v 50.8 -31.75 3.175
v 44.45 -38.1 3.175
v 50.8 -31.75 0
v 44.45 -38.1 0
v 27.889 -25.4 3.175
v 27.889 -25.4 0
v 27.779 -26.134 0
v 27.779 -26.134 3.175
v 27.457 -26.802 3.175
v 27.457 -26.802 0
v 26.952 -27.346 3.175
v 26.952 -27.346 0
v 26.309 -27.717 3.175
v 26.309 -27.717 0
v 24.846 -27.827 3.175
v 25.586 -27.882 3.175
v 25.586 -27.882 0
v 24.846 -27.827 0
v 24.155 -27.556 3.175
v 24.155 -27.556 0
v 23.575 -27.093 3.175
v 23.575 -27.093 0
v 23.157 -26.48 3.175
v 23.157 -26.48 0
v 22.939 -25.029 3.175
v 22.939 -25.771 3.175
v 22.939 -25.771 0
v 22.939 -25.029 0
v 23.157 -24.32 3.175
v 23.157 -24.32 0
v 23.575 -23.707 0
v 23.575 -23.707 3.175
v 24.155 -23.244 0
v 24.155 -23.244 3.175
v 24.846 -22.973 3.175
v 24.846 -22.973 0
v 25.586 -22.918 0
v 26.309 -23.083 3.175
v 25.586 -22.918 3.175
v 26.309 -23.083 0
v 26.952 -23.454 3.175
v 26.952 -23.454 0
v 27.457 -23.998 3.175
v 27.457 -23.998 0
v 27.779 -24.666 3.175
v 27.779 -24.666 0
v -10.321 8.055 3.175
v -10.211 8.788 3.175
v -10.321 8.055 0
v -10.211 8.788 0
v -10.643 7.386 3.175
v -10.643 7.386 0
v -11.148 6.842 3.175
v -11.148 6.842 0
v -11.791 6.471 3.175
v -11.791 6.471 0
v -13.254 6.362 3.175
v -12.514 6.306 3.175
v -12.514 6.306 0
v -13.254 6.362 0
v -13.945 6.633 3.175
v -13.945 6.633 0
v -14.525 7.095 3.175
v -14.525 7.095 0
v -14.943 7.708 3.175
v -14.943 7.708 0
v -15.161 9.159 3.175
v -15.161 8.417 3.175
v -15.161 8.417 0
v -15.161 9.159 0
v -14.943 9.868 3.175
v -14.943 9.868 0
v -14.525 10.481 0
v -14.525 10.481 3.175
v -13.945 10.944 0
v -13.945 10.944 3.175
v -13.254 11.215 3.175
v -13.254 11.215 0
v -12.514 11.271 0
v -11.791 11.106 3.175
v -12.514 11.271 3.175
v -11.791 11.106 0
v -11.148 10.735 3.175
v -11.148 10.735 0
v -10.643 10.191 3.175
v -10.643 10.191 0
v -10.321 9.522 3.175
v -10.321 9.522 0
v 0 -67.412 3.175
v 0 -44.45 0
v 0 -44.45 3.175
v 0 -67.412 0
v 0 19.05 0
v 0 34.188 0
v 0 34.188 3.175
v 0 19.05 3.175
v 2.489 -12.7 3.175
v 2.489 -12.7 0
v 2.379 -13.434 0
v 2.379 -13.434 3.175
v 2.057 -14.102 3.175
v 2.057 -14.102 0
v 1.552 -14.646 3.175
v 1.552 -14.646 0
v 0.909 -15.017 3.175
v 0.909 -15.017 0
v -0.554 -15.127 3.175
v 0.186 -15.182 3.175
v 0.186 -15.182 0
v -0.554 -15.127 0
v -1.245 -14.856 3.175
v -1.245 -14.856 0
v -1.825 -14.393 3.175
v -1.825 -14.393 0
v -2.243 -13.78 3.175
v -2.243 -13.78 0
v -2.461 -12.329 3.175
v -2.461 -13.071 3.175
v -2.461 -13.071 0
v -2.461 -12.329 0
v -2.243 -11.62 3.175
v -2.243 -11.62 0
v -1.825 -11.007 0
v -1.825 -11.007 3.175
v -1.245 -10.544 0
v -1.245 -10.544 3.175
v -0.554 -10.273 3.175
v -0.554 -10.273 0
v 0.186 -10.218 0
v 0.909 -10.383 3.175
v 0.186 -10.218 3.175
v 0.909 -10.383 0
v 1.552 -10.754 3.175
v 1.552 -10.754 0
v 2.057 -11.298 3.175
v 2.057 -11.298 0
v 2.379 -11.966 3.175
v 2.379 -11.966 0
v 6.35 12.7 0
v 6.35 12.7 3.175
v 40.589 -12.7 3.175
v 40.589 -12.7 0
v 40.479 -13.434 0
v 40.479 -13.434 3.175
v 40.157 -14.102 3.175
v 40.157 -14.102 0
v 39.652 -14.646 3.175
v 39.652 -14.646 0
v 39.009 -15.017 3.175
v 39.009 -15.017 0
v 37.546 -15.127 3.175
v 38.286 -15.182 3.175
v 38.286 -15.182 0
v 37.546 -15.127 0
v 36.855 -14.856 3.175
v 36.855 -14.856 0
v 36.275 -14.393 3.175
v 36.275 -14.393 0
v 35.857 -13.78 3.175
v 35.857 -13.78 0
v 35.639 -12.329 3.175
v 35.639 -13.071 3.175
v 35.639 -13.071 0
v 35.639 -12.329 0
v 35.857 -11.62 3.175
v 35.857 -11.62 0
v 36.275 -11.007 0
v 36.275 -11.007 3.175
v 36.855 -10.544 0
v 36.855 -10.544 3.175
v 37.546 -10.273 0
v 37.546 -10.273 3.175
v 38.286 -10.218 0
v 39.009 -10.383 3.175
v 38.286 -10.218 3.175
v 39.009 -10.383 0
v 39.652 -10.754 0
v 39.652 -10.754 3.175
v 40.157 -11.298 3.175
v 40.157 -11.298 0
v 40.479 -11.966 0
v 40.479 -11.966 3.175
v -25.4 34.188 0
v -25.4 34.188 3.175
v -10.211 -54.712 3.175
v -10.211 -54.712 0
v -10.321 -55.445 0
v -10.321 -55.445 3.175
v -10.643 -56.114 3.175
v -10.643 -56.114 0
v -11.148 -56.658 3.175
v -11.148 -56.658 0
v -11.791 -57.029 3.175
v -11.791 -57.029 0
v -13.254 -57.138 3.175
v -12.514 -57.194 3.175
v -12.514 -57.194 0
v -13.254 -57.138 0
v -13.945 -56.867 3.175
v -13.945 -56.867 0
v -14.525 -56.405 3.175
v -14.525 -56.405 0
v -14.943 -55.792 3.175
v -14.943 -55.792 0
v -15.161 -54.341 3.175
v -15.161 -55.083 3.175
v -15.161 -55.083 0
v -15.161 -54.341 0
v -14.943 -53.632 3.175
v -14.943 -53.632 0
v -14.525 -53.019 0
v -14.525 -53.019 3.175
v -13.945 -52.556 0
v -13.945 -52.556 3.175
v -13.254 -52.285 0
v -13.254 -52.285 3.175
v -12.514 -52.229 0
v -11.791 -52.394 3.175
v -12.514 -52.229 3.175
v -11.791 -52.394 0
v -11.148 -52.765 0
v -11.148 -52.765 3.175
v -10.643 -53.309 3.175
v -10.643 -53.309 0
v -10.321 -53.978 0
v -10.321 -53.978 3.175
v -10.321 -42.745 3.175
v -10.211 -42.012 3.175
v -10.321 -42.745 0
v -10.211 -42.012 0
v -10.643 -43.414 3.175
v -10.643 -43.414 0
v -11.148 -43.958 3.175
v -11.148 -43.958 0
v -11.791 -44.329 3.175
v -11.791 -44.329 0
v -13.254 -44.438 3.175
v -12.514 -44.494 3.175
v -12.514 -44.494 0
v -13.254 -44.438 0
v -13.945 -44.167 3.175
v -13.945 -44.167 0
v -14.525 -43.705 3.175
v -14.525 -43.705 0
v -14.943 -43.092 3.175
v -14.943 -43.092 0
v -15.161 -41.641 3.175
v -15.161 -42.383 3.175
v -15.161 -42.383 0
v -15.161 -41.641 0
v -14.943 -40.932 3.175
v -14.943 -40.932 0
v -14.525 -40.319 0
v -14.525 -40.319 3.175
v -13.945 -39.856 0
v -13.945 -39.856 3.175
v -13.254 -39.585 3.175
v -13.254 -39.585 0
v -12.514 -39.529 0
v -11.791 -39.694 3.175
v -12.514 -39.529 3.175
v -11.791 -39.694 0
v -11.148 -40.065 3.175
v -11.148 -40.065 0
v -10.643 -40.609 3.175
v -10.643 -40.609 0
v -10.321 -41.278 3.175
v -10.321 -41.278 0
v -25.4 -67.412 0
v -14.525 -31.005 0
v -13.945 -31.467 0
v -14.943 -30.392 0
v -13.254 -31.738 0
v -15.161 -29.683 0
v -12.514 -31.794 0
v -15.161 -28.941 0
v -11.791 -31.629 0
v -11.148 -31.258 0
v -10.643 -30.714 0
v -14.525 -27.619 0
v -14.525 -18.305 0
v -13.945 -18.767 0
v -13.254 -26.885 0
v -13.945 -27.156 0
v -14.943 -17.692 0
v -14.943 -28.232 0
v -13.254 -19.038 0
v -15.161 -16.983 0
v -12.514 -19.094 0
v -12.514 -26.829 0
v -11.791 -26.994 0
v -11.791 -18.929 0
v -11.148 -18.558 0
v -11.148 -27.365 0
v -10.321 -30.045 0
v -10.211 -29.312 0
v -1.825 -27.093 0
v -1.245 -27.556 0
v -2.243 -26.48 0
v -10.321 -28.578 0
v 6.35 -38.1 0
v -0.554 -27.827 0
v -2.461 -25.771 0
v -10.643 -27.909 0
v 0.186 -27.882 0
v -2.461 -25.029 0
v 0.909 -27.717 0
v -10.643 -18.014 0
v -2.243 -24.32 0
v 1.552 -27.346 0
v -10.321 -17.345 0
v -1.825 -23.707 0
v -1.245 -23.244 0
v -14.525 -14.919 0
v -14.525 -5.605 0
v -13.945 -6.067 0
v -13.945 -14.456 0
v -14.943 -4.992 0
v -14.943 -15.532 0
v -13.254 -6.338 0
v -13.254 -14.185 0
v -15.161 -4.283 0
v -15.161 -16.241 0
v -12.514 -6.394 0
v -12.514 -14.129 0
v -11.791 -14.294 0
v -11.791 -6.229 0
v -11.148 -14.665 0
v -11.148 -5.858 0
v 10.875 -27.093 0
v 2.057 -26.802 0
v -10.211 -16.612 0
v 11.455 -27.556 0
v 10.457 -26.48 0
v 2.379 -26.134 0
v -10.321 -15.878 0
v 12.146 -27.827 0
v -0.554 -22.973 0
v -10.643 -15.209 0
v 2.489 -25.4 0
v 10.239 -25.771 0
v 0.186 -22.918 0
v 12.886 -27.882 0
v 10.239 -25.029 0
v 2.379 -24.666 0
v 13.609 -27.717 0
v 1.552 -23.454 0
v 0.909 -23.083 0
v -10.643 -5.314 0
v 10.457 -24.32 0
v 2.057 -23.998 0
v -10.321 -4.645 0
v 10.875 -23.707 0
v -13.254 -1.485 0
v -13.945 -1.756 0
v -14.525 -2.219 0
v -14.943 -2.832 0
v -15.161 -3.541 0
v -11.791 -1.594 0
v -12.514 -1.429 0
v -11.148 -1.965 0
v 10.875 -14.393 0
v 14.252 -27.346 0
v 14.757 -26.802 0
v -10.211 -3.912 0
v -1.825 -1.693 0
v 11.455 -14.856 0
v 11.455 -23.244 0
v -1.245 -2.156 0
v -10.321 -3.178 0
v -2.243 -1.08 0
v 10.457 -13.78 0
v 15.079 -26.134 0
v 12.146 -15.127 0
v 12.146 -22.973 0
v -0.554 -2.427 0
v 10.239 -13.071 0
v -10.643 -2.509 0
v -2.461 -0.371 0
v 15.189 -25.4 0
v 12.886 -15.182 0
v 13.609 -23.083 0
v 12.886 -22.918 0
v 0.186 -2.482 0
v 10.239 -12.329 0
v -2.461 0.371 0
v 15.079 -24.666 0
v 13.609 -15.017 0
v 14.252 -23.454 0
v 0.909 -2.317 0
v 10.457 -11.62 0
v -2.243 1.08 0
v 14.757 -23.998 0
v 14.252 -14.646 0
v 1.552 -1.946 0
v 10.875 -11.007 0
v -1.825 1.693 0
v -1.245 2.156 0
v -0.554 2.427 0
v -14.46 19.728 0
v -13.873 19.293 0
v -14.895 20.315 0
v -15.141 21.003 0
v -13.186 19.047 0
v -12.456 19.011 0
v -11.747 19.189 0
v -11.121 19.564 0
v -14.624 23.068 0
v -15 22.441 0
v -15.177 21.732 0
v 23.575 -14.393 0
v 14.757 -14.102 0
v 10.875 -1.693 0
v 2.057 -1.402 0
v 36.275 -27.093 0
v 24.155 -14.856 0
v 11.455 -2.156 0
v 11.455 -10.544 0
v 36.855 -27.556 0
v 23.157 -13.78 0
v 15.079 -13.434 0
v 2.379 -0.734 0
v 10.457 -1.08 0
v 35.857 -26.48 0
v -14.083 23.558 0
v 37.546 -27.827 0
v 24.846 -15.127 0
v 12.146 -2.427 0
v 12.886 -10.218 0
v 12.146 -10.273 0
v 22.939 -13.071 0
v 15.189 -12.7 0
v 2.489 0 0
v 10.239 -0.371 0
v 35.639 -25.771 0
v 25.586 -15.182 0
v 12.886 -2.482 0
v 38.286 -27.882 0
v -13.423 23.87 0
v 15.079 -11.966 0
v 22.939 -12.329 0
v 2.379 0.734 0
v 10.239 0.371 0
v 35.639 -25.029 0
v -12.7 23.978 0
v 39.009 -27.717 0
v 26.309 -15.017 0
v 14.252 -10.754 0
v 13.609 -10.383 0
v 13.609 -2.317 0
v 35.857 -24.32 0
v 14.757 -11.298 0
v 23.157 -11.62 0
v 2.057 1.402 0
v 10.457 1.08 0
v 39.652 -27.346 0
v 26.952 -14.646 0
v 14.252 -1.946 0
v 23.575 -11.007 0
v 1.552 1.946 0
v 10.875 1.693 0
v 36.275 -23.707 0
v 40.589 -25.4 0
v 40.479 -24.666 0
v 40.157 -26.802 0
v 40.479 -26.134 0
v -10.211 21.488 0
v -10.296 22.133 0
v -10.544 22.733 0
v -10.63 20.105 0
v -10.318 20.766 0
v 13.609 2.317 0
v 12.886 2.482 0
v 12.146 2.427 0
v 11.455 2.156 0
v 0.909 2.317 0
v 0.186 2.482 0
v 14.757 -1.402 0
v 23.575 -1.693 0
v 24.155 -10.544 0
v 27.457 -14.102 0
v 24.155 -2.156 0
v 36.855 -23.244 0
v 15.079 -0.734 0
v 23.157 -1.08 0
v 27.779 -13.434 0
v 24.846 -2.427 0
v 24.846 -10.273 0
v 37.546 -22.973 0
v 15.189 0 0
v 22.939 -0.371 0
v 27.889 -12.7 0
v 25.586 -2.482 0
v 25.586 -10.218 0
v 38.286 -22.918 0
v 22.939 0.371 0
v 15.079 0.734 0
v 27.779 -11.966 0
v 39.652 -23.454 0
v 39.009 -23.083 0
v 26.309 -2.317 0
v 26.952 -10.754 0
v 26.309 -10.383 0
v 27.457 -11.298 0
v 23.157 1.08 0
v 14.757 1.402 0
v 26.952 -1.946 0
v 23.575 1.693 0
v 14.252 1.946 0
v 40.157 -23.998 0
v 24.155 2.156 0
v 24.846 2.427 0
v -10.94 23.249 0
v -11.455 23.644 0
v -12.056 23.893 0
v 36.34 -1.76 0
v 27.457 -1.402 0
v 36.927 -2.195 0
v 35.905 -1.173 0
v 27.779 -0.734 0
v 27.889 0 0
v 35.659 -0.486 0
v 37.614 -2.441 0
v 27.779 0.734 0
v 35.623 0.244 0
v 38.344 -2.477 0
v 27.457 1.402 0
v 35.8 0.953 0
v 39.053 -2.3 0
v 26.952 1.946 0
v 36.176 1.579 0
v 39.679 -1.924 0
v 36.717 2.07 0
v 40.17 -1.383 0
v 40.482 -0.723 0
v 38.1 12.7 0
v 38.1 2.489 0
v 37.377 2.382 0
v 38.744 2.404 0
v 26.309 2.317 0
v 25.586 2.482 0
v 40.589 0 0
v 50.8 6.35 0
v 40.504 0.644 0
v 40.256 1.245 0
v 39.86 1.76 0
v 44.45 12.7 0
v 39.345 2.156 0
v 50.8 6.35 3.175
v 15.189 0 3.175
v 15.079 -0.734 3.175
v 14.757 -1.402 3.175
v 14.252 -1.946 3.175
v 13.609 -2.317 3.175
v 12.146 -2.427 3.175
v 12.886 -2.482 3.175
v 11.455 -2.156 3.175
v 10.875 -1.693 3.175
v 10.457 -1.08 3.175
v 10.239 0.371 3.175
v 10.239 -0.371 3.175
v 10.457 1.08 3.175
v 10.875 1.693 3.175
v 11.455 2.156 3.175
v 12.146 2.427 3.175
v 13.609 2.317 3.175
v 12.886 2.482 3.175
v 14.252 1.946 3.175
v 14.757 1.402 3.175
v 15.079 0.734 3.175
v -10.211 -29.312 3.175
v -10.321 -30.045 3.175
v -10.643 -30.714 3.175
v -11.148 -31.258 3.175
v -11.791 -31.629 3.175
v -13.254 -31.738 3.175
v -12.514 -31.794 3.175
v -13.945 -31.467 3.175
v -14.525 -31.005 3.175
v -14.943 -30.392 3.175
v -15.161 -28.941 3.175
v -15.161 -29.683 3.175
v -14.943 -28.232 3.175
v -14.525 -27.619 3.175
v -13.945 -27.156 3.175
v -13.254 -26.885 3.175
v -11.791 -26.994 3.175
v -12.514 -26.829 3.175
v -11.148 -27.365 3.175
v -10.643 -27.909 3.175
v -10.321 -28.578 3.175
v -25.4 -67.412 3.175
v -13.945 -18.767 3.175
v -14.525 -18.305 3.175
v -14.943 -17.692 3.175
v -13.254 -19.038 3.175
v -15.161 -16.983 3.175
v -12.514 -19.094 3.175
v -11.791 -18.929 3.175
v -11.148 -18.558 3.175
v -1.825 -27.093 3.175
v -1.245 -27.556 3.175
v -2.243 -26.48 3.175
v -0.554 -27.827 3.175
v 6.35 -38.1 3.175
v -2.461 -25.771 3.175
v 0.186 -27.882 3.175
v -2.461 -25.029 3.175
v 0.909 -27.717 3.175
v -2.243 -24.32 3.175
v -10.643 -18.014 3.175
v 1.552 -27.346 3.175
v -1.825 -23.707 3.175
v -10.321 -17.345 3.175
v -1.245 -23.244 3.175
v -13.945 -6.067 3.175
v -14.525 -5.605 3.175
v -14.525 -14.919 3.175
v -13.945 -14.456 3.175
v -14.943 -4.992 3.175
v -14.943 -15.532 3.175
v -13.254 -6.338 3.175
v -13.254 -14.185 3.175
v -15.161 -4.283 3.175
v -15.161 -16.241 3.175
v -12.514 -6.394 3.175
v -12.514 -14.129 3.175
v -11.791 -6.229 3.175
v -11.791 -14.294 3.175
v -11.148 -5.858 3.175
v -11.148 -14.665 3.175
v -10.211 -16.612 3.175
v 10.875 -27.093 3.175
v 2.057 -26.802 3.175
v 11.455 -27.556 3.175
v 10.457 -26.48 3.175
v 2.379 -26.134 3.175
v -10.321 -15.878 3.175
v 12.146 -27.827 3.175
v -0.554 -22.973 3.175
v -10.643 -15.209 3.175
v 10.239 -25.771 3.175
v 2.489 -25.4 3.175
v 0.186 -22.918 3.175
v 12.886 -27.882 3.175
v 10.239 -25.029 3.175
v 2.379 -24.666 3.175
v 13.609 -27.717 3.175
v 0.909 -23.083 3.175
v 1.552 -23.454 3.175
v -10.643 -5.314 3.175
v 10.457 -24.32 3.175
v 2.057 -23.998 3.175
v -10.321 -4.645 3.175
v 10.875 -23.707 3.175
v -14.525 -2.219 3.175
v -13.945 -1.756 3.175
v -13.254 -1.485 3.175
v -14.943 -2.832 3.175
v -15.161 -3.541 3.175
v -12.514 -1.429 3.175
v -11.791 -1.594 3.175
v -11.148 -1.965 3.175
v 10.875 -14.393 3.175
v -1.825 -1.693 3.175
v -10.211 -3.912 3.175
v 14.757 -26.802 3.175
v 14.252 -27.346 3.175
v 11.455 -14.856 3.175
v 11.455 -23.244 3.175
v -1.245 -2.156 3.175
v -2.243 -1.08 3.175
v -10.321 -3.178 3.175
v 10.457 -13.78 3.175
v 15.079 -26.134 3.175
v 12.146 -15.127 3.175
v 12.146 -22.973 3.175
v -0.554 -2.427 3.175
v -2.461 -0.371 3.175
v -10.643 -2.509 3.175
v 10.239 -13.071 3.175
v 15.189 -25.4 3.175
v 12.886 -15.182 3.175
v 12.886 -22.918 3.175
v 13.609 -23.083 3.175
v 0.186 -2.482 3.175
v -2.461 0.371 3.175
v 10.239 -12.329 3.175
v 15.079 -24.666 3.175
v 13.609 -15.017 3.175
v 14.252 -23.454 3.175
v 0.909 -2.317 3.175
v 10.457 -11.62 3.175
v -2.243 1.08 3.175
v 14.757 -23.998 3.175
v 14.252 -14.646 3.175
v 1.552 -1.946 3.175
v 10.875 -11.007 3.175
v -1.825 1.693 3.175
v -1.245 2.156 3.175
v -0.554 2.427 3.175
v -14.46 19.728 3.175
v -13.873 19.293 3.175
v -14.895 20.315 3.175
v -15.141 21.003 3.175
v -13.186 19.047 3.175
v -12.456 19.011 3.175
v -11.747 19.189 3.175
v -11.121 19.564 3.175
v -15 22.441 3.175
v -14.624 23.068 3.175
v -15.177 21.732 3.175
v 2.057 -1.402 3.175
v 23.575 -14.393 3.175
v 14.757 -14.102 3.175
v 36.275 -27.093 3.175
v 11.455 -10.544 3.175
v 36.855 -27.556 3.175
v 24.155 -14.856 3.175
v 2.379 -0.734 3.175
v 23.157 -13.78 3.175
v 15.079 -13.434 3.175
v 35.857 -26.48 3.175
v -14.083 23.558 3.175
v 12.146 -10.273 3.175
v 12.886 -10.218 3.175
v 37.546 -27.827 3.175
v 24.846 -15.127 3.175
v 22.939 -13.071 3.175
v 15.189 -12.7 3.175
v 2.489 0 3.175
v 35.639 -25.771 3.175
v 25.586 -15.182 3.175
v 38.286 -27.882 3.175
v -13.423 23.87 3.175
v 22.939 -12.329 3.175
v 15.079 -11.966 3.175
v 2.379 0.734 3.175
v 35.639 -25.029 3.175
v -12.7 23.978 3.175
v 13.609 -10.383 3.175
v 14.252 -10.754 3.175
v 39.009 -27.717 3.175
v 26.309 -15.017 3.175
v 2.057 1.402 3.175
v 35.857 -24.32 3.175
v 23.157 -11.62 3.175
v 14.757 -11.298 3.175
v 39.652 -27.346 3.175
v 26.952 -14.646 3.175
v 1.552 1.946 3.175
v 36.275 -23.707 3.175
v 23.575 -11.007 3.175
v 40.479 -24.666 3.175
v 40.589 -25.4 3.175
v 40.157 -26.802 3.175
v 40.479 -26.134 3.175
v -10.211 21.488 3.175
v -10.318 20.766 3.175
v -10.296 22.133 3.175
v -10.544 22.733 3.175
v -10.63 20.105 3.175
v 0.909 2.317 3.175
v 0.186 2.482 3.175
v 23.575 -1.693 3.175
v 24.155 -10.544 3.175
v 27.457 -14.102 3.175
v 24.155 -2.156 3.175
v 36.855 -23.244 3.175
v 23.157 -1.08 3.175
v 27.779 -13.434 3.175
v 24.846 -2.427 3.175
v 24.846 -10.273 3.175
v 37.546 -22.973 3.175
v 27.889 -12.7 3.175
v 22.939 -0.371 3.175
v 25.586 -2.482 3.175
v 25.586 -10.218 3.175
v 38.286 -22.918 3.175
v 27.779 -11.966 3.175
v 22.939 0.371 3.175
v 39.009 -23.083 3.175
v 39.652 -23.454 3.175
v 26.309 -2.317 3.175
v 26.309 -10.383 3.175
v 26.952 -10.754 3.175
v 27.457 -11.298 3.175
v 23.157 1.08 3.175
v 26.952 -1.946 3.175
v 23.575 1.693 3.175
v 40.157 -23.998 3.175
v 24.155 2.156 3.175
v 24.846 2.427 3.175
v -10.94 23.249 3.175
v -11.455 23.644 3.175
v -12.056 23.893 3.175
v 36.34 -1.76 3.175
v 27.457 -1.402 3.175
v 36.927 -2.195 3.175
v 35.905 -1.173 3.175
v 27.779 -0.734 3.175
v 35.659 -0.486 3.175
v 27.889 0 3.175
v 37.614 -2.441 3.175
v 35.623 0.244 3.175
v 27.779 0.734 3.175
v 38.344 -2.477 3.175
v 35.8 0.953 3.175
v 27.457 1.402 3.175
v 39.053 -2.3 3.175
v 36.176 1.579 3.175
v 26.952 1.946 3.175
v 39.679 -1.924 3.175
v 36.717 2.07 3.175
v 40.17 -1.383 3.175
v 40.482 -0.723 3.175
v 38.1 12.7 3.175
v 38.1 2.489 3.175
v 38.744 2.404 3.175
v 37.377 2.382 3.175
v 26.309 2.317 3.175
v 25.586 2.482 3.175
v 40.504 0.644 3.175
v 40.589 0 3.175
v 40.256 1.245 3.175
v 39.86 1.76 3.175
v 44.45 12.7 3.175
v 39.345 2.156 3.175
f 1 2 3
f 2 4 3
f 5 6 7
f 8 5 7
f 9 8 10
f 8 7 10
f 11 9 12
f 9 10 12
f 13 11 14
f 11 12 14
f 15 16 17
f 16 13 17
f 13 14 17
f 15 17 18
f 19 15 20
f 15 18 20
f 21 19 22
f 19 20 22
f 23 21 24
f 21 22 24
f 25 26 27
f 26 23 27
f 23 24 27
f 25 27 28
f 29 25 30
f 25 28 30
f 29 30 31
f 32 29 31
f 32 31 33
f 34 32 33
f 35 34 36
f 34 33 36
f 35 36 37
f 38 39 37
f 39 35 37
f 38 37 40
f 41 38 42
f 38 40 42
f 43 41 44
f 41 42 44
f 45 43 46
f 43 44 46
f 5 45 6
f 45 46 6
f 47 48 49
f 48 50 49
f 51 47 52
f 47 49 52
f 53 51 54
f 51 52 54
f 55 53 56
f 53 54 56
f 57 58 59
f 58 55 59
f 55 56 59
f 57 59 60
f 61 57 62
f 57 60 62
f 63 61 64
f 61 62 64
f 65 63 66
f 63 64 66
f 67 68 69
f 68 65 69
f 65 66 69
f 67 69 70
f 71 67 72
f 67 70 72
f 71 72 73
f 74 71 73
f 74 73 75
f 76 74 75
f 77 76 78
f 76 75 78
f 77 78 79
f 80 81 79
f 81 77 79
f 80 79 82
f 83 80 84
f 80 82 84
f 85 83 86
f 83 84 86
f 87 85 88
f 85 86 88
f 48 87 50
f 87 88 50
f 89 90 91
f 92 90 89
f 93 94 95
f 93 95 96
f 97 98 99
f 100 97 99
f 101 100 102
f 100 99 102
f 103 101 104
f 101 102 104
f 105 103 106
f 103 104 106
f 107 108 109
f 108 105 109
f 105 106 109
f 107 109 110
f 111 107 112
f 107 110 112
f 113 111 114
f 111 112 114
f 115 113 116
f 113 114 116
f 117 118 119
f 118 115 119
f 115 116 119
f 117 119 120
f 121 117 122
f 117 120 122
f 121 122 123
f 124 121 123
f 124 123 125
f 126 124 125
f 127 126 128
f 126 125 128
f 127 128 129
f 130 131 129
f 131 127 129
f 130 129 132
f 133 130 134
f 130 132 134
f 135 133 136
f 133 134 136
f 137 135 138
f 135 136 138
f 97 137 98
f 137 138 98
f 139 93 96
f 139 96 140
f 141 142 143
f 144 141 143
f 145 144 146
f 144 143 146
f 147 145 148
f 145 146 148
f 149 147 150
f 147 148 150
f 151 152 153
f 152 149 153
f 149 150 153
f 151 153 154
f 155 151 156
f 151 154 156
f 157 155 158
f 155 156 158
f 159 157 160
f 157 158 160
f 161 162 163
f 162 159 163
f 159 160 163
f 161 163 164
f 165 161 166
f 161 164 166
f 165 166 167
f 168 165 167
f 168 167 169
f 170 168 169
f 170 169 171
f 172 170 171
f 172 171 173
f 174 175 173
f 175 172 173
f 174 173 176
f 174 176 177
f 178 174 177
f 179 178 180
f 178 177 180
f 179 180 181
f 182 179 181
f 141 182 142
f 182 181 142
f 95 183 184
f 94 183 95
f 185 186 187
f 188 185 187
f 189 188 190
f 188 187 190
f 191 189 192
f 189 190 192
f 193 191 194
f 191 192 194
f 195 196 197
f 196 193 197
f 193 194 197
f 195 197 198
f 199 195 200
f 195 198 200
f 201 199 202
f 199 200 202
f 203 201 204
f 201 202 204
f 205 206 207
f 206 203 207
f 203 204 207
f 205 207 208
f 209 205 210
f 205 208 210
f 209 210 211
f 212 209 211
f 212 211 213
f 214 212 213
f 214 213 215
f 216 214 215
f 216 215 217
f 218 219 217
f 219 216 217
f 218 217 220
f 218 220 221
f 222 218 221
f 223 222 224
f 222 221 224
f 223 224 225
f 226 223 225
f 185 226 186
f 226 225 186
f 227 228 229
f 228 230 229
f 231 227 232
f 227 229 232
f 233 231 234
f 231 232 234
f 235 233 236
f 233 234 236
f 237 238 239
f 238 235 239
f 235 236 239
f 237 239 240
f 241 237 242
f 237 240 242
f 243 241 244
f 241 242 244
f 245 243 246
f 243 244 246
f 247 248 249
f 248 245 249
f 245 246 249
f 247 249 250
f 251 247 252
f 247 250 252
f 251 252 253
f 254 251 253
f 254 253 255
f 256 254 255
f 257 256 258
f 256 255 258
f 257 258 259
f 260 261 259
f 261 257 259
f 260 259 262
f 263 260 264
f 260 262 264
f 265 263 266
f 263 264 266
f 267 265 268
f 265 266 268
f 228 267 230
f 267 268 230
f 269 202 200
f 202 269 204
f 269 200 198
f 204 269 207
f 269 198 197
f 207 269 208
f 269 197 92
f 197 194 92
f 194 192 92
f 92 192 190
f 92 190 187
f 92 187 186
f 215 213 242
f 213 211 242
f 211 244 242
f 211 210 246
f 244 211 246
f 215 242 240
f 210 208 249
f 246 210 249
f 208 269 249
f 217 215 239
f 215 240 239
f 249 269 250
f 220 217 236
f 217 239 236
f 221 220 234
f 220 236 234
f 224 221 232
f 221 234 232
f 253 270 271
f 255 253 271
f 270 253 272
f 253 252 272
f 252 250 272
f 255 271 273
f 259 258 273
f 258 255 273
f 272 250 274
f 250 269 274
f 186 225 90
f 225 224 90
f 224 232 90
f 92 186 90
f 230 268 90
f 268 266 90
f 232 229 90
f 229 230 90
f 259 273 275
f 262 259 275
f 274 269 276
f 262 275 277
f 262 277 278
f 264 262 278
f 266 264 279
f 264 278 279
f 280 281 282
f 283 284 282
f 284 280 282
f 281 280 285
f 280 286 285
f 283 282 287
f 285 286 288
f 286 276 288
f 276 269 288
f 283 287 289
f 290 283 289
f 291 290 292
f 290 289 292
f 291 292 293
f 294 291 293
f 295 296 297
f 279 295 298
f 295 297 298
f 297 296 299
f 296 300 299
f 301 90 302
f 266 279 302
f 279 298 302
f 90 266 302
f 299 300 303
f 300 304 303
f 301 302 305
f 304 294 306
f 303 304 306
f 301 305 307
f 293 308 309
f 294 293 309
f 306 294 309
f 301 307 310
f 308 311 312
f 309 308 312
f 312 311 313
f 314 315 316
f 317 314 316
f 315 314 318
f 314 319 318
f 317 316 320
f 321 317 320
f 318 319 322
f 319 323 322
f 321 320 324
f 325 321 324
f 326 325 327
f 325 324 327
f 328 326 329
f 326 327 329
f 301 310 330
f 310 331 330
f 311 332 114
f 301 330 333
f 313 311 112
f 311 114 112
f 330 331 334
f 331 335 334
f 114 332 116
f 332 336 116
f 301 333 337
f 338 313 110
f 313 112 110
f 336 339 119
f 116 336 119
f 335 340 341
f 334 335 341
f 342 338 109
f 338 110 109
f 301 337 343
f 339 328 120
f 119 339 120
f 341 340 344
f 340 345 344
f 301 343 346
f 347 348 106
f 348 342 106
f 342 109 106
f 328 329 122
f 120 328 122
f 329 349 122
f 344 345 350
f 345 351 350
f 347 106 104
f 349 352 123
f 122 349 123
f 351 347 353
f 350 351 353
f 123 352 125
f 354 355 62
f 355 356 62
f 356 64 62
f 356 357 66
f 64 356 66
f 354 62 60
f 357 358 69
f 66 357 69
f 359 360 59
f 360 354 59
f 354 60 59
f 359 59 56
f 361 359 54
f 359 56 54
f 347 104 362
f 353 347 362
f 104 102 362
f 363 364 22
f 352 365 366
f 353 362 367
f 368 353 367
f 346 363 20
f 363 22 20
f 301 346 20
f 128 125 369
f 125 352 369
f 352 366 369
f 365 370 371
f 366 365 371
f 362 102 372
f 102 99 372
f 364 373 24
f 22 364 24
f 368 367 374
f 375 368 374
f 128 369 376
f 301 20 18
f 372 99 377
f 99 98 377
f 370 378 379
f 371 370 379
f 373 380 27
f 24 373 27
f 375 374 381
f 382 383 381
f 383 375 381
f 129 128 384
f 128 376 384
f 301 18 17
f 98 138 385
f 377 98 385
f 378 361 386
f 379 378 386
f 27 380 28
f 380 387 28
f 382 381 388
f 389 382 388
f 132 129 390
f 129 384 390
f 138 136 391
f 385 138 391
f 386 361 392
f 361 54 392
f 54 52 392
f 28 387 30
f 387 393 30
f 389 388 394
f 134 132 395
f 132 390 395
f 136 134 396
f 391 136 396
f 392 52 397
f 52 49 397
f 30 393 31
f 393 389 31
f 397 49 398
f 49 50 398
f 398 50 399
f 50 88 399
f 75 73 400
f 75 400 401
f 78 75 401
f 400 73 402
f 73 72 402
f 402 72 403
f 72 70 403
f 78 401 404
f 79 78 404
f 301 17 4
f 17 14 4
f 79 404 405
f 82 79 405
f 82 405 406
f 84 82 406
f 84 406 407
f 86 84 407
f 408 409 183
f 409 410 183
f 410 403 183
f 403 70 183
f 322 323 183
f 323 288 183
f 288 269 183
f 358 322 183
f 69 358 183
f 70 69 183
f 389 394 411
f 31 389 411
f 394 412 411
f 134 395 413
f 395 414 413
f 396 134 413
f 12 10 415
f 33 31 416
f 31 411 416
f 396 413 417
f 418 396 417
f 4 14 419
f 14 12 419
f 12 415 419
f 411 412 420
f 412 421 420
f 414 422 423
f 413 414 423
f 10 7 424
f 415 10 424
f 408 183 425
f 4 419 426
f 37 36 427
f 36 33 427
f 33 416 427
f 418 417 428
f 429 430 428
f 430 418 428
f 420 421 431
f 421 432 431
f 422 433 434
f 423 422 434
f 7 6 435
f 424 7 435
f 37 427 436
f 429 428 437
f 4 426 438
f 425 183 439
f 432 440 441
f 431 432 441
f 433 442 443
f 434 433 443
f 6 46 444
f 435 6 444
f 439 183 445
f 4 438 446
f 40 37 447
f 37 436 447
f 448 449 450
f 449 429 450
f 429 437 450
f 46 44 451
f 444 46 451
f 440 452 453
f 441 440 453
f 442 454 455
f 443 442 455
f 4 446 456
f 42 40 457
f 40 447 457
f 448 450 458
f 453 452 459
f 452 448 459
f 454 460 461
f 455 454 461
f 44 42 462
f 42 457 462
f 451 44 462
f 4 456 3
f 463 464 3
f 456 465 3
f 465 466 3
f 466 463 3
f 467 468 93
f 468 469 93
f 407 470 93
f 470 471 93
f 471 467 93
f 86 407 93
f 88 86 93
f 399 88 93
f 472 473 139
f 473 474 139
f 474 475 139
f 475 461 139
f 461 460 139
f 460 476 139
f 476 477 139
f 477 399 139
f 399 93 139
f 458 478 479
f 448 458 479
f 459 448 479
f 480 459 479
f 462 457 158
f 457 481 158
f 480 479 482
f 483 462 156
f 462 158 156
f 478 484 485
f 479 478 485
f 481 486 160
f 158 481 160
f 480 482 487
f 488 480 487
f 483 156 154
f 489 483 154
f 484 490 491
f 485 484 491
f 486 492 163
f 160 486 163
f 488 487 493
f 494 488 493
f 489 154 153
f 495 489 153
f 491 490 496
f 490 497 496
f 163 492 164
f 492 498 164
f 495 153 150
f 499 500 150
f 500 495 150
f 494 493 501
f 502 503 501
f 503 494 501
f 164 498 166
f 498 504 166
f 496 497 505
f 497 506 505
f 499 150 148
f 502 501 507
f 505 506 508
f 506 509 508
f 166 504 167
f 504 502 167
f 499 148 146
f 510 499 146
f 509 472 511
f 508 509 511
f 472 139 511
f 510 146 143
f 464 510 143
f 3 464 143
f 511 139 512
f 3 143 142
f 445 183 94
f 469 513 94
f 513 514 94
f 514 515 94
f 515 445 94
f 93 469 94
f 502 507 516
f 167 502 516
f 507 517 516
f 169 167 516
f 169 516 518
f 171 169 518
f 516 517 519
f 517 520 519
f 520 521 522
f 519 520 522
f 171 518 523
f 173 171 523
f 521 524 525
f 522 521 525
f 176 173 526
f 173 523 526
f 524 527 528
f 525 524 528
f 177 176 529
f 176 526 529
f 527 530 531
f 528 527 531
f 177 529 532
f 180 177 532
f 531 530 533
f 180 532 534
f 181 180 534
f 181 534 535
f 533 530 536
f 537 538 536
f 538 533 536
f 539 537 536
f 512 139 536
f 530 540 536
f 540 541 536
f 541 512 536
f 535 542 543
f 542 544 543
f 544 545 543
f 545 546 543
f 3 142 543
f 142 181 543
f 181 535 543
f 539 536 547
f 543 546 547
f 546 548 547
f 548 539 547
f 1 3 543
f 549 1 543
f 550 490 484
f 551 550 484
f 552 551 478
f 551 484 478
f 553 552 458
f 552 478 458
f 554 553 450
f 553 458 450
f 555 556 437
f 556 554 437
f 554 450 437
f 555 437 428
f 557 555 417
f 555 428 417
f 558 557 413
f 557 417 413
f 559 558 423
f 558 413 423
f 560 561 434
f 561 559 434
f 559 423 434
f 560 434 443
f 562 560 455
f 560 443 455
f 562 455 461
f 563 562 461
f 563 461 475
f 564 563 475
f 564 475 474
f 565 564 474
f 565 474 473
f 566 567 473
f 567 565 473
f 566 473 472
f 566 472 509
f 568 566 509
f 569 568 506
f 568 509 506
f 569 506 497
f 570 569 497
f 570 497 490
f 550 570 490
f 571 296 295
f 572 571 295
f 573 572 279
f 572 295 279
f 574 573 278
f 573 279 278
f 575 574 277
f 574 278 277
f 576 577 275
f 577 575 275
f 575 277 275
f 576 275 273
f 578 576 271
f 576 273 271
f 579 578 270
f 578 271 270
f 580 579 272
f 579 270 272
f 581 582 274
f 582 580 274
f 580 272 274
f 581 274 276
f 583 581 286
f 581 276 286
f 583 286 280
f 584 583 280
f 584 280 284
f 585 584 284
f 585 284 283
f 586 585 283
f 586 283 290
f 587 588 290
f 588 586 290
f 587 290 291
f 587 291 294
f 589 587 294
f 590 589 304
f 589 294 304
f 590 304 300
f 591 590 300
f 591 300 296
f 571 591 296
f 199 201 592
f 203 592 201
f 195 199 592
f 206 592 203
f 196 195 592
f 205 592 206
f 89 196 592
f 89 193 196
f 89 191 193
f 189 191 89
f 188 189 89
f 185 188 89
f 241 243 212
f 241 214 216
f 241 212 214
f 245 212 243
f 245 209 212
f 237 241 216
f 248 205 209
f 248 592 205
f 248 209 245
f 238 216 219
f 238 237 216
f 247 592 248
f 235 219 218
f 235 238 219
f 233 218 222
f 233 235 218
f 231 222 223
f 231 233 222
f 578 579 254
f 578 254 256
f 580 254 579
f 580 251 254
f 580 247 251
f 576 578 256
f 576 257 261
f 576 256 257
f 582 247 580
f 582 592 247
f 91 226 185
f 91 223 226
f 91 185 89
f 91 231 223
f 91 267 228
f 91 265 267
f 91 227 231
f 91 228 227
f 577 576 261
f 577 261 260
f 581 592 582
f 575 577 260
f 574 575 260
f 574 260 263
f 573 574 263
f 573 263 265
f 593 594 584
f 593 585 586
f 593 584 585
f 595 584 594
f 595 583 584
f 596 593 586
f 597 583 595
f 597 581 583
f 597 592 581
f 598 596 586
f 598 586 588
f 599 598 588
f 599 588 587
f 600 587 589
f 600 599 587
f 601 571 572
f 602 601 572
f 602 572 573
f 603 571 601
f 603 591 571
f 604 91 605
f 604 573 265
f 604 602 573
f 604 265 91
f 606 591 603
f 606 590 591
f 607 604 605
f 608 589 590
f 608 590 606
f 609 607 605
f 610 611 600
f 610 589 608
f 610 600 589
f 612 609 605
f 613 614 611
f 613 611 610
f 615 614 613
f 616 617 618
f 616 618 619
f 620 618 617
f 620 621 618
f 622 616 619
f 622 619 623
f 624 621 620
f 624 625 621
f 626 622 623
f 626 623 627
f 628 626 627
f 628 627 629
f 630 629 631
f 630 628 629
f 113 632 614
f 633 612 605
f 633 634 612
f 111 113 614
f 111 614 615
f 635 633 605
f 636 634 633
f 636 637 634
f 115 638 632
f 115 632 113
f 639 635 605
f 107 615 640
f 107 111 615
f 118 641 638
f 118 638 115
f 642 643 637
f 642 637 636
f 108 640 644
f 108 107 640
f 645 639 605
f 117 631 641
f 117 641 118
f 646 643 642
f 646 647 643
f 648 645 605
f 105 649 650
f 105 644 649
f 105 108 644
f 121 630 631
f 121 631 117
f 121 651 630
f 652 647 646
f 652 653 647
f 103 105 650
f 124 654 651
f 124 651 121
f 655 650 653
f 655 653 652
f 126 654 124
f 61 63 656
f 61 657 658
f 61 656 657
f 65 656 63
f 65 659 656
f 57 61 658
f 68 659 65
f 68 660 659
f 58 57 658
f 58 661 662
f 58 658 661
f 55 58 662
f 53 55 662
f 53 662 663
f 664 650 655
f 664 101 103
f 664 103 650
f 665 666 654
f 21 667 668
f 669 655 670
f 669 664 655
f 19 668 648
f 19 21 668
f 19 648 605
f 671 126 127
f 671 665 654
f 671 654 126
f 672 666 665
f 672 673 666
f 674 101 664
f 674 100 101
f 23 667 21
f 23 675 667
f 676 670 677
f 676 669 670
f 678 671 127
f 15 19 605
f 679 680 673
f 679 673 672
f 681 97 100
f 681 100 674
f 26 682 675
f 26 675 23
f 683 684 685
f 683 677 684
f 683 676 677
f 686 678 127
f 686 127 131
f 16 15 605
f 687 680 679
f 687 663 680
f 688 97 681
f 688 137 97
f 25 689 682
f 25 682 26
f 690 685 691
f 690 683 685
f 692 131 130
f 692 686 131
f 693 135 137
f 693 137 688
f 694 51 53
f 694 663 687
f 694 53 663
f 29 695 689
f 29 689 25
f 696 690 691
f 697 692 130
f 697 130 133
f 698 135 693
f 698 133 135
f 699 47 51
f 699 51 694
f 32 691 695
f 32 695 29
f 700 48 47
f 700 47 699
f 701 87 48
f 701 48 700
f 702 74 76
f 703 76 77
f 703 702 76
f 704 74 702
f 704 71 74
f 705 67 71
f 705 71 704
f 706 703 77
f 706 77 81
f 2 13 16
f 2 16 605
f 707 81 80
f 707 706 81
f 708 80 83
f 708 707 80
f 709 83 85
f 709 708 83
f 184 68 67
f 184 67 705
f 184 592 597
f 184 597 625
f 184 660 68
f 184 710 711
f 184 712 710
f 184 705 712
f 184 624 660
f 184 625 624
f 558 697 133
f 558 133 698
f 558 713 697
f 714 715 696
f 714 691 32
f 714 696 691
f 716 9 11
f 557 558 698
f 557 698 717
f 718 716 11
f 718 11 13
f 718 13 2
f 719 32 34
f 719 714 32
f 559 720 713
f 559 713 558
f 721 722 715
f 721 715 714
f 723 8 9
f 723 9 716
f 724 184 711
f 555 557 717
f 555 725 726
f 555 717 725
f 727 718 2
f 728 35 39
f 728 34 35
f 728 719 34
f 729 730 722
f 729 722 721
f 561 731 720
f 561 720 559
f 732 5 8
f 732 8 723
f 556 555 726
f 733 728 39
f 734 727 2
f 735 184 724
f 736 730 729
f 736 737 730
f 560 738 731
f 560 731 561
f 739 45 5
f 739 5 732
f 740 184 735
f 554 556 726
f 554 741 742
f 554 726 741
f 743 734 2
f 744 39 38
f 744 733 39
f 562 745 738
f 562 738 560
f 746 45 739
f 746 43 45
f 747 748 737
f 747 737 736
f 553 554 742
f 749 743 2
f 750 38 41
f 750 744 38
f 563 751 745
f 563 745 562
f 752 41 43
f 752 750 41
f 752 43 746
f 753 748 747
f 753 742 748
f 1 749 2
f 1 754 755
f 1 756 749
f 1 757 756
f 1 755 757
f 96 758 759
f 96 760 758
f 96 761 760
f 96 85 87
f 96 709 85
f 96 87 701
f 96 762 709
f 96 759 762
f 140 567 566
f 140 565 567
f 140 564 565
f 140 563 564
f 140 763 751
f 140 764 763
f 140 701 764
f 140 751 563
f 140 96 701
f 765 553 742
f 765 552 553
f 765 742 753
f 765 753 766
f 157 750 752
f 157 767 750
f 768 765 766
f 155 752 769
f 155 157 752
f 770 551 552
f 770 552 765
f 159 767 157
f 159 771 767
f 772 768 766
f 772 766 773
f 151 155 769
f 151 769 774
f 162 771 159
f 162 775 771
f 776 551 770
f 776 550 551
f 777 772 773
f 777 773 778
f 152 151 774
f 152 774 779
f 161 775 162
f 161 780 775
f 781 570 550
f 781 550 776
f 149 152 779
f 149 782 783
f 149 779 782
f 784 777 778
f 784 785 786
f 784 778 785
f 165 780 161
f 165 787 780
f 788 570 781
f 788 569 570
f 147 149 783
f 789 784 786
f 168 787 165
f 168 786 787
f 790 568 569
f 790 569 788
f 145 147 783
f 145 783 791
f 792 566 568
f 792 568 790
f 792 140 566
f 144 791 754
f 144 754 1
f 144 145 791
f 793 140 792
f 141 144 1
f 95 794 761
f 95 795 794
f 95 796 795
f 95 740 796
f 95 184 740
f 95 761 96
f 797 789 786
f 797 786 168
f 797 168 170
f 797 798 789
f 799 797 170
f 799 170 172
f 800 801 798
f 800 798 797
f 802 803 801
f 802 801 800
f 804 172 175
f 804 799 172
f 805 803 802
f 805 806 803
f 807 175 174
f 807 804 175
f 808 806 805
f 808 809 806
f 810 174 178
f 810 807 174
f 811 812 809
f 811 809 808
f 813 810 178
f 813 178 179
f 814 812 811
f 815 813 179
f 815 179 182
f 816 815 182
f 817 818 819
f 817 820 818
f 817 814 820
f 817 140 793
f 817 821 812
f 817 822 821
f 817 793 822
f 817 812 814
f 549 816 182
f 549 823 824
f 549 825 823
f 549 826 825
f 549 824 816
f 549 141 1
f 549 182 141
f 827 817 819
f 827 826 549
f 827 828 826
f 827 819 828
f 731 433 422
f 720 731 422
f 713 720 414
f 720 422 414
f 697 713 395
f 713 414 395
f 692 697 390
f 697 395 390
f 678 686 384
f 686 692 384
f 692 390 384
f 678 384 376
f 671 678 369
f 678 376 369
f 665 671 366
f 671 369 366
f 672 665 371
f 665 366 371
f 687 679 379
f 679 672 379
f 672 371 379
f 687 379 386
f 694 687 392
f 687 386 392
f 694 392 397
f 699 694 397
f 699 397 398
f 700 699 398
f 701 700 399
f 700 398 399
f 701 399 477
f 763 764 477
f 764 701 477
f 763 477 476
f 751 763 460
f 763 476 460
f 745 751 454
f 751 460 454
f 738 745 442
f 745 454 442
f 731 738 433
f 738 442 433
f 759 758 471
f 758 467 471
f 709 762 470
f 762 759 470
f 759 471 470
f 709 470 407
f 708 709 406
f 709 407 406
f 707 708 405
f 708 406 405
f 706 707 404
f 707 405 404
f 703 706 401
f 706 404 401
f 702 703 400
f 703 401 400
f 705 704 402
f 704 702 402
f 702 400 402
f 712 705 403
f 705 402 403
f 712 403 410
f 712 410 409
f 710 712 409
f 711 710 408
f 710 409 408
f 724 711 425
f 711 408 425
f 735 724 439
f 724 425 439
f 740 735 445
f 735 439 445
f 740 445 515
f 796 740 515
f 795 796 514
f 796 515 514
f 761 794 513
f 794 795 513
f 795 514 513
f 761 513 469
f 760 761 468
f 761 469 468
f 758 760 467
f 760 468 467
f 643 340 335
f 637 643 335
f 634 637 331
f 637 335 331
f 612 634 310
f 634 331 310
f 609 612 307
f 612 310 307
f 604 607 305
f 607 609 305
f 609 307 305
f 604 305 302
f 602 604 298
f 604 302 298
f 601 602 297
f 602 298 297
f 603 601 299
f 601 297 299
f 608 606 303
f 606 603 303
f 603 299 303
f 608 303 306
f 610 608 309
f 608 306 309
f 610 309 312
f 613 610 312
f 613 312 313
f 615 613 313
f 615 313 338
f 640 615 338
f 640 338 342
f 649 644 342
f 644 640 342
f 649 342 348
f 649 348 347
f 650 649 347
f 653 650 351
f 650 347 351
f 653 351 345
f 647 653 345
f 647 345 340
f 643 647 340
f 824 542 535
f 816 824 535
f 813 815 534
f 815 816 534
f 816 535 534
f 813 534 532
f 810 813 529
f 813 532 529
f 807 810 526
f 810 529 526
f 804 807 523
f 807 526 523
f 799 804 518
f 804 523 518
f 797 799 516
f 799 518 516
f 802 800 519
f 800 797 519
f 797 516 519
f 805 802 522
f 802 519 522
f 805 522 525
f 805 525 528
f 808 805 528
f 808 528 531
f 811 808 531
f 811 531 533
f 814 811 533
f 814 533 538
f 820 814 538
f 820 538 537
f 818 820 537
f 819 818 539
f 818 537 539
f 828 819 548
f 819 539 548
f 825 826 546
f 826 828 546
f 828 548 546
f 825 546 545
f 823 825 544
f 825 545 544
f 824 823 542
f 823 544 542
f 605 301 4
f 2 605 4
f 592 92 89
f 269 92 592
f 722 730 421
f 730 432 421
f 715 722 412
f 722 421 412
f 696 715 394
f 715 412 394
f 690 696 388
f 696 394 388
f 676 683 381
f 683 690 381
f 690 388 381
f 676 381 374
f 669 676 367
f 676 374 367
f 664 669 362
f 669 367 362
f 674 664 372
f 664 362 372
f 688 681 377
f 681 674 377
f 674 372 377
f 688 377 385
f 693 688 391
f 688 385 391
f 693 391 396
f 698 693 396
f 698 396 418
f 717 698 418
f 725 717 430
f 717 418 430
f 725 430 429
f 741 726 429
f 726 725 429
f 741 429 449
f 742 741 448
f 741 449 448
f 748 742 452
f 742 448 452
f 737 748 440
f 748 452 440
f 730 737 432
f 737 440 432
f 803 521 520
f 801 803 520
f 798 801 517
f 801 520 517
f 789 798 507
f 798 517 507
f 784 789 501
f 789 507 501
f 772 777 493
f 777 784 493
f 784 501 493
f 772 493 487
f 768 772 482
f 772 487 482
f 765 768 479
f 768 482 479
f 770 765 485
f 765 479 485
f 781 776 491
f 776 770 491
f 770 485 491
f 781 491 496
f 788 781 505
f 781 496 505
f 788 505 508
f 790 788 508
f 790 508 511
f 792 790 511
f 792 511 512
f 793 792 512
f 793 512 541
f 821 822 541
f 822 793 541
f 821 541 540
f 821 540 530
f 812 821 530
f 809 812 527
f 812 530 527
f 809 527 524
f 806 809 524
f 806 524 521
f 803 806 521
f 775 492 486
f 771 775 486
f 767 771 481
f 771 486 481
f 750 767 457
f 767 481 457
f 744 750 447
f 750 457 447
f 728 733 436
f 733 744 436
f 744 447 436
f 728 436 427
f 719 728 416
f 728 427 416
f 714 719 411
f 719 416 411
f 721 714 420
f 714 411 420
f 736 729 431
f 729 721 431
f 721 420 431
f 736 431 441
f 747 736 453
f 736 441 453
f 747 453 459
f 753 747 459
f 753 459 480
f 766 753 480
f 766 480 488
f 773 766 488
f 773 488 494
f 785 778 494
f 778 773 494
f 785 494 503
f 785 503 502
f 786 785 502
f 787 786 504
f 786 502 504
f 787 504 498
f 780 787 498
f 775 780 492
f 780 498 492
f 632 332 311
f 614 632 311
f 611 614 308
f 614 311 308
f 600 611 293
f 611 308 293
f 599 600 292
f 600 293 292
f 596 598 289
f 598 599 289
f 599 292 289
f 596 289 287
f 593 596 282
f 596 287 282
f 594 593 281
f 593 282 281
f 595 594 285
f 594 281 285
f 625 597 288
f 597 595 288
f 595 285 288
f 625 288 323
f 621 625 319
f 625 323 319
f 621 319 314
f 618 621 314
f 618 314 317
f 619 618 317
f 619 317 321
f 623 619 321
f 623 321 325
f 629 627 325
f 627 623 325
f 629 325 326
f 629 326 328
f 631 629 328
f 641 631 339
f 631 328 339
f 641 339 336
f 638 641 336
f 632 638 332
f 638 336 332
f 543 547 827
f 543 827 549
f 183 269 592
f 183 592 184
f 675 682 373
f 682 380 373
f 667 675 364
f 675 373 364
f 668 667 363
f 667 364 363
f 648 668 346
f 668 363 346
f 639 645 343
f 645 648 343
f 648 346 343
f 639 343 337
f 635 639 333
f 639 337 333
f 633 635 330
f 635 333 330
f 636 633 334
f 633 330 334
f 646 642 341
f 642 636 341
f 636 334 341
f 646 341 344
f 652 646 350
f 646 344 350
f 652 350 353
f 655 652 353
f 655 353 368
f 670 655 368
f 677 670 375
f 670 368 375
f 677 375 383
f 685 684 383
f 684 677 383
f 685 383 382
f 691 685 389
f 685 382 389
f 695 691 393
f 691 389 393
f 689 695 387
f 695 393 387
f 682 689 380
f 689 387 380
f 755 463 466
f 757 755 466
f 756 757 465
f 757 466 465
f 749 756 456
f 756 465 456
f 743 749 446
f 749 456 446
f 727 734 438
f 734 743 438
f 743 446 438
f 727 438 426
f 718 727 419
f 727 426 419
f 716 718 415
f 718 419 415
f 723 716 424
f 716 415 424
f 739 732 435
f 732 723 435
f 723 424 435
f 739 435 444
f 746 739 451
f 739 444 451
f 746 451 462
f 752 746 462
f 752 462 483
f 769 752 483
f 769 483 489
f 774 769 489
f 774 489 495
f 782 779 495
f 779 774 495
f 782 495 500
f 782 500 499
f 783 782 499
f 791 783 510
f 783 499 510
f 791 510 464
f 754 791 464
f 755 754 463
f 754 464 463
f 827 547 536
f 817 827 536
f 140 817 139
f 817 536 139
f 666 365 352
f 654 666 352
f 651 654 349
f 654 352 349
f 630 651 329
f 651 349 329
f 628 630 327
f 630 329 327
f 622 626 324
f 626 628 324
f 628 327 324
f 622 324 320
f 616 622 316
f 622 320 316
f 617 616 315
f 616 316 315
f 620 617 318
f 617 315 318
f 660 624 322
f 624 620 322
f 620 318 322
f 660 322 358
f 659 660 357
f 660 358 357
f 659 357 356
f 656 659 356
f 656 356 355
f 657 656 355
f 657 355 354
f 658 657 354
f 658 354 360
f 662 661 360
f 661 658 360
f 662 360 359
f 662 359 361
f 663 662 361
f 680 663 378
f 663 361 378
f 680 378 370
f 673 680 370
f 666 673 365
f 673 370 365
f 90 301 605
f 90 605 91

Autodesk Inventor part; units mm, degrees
ref_plane "YZ Plane" through (0, 0, 0) normal (1, 0, 0) x (0, 1, 0)
ref_plane "XZ Plane" through (0, 0, 0) normal (0, 1, 0) x (-1, 0, 0)
ref_plane "XY Plane" through (0, 0, 0) normal (0, 0, 1) x (1, 0, 0)
sketch "Sketch1" plane through (0, 0, 0) normal (0, 0, 1) x (1, 0, 0)
  circle A0 centre (0, 0) radius 2.4892
  circle A1 centre (-12.7, 8.7884) radius 2.4892
  line L0 (-20.7225, -6.5967) -> (-20.7225, -16.769) construction
  line L1 (-24.8179, -11.6828) -> (-17.0895, -11.6828) construction
  circle A2 centre (-12.7, 21.4884) radius 2.4892
  circle A3 centre (-12.7, 34.1884) radius 2.4892
  circle A4 centre (-12.7, 46.8884) radius 2.4892
  circle A5 centre (12.7, 0) radius 2.4892
  circle A6 centre (25.4, 0) radius 2.4892
  circle A7 centre (38.1, 0) radius 2.4892
  circle A8 centre (0, -12.7) radius 2.4892
  circle A9 centre (12.7, -12.7) radius 2.4892
  circle A10 centre (25.4, -12.7) radius 2.4892
  circle A11 centre (38.1, -12.7) radius 2.4892
  circle A12 centre (-12.7, -3.9116) radius 2.4892
  circle A13 centre (0, -25.4) radius 2.4892
  circle A14 centre (12.7, -25.4) radius 2.4892
  circle A15 centre (25.4, -25.4) radius 2.4892
  circle A16 centre (38.1, -25.4) radius 2.4892
  circle A17 centre (-12.7, -16.6116) radius 2.4892
  circle A18 centre (-12.7, -29.3116) radius 2.4892
  circle A19 centre (-12.7, -42.0116) radius 2.4892
  line L2 (38.1, 0) -> (38.1, 12.7)
  line L3 (38.1, 12.7) -> (44.45, 12.7)
  line L4 (50.8, 12.7) -> (6.35, 12.7)
  line L5 (6.35, -38.1) -> (44.45, -38.1)
  line L6 (50.8, -31.75) -> (50.8, 6.35)
  line L7 (0, -44.45) -> (0, -54.7116)
  line L8 (-25.4, -54.7116) -> (-25.4, 34.1884)
  line L9 (0, 34.1884) -> (0, 19.05)
  line L10 (0, 19.05) -> (6.35, 12.7)
  line L11 (6.35, -38.1) -> (0, -44.45)
  line L12 (44.45, -38.1) -> (50.8, -31.75)
  line L13 (44.45, 12.7) -> (50.8, 6.35)
  circle A20 centre (-12.7, -54.7116) radius 2.4892
  line L14 (-12.7, 21.4884) -> (-12.7, 34.1884)
  line L15 (-12.7, 34.1884) -> (-25.4, 34.1884)
  line L16 (-25.4, 34.1884) -> (-25.4, 34.1884)
  line L17 (-12.7, 34.1884) -> (0, 34.1884)
  line L18 (0, 34.1884) -> (0, 34.1884)
  line L19 (0, -49.5808) -> (0, -67.4116)
  line L20 (0, -67.4116) -> (-25.4, -67.4116)
  line L21 (-25.4, -67.4116) -> (-25.4, -54.7116)
  point P0 (0, -38.1)
  point P1 (0, 12.7)
  point P2 (50.8, -38.1)
  dimension "d0" = 4.9784
  dimension "d1" = 4.9784
  dimension "d2" = 8.7884
  dimension "d3" = 12.7
  dimension "d6" = 12.7
  dimension "d13" = 12.7
  dimension "d28" = 12.7
  dimension "d35" = 12.7
  dimension "d42" = 12.7
  dimension "d43" = 12.7
  dimension "d44" = 50.8
  dimension "d45" = 16.6116
  dimension "d46" = 25.4
  dimension "d47" = 88.9
  dimension "d48" = 6.35
  dimension "d49" = 6.35
  dimension "d50" = 6.35
  dimension "d51" = 6.35
  dimension "d52" = 6.35
  dimension "d53" = 6.35
  dimension "d54" = 6.35
  dimension "d55" = 6.35
  dimension "d60" = 12.7
  dimension "d66" = 12.7
extrude "Extrusion2" add sketch "Sketch1" along normal blind 3.175 contours A3 L17 L9 L10 L4 L3 L13 L6 L12 L5 L11 L7 L19 L20 L21 L8 L15 | A3 L15 L14 | L14 L17 A3
equation "\"d49\" = d48"
equation "\"d51\" = d50"
equation "\"d53\" = d52"
equation "\"d54\" = d52"
equation "\"d55\" = d54"
properties part number "Custom-Underside-L-Gusset" material "Aluminum 6061"
